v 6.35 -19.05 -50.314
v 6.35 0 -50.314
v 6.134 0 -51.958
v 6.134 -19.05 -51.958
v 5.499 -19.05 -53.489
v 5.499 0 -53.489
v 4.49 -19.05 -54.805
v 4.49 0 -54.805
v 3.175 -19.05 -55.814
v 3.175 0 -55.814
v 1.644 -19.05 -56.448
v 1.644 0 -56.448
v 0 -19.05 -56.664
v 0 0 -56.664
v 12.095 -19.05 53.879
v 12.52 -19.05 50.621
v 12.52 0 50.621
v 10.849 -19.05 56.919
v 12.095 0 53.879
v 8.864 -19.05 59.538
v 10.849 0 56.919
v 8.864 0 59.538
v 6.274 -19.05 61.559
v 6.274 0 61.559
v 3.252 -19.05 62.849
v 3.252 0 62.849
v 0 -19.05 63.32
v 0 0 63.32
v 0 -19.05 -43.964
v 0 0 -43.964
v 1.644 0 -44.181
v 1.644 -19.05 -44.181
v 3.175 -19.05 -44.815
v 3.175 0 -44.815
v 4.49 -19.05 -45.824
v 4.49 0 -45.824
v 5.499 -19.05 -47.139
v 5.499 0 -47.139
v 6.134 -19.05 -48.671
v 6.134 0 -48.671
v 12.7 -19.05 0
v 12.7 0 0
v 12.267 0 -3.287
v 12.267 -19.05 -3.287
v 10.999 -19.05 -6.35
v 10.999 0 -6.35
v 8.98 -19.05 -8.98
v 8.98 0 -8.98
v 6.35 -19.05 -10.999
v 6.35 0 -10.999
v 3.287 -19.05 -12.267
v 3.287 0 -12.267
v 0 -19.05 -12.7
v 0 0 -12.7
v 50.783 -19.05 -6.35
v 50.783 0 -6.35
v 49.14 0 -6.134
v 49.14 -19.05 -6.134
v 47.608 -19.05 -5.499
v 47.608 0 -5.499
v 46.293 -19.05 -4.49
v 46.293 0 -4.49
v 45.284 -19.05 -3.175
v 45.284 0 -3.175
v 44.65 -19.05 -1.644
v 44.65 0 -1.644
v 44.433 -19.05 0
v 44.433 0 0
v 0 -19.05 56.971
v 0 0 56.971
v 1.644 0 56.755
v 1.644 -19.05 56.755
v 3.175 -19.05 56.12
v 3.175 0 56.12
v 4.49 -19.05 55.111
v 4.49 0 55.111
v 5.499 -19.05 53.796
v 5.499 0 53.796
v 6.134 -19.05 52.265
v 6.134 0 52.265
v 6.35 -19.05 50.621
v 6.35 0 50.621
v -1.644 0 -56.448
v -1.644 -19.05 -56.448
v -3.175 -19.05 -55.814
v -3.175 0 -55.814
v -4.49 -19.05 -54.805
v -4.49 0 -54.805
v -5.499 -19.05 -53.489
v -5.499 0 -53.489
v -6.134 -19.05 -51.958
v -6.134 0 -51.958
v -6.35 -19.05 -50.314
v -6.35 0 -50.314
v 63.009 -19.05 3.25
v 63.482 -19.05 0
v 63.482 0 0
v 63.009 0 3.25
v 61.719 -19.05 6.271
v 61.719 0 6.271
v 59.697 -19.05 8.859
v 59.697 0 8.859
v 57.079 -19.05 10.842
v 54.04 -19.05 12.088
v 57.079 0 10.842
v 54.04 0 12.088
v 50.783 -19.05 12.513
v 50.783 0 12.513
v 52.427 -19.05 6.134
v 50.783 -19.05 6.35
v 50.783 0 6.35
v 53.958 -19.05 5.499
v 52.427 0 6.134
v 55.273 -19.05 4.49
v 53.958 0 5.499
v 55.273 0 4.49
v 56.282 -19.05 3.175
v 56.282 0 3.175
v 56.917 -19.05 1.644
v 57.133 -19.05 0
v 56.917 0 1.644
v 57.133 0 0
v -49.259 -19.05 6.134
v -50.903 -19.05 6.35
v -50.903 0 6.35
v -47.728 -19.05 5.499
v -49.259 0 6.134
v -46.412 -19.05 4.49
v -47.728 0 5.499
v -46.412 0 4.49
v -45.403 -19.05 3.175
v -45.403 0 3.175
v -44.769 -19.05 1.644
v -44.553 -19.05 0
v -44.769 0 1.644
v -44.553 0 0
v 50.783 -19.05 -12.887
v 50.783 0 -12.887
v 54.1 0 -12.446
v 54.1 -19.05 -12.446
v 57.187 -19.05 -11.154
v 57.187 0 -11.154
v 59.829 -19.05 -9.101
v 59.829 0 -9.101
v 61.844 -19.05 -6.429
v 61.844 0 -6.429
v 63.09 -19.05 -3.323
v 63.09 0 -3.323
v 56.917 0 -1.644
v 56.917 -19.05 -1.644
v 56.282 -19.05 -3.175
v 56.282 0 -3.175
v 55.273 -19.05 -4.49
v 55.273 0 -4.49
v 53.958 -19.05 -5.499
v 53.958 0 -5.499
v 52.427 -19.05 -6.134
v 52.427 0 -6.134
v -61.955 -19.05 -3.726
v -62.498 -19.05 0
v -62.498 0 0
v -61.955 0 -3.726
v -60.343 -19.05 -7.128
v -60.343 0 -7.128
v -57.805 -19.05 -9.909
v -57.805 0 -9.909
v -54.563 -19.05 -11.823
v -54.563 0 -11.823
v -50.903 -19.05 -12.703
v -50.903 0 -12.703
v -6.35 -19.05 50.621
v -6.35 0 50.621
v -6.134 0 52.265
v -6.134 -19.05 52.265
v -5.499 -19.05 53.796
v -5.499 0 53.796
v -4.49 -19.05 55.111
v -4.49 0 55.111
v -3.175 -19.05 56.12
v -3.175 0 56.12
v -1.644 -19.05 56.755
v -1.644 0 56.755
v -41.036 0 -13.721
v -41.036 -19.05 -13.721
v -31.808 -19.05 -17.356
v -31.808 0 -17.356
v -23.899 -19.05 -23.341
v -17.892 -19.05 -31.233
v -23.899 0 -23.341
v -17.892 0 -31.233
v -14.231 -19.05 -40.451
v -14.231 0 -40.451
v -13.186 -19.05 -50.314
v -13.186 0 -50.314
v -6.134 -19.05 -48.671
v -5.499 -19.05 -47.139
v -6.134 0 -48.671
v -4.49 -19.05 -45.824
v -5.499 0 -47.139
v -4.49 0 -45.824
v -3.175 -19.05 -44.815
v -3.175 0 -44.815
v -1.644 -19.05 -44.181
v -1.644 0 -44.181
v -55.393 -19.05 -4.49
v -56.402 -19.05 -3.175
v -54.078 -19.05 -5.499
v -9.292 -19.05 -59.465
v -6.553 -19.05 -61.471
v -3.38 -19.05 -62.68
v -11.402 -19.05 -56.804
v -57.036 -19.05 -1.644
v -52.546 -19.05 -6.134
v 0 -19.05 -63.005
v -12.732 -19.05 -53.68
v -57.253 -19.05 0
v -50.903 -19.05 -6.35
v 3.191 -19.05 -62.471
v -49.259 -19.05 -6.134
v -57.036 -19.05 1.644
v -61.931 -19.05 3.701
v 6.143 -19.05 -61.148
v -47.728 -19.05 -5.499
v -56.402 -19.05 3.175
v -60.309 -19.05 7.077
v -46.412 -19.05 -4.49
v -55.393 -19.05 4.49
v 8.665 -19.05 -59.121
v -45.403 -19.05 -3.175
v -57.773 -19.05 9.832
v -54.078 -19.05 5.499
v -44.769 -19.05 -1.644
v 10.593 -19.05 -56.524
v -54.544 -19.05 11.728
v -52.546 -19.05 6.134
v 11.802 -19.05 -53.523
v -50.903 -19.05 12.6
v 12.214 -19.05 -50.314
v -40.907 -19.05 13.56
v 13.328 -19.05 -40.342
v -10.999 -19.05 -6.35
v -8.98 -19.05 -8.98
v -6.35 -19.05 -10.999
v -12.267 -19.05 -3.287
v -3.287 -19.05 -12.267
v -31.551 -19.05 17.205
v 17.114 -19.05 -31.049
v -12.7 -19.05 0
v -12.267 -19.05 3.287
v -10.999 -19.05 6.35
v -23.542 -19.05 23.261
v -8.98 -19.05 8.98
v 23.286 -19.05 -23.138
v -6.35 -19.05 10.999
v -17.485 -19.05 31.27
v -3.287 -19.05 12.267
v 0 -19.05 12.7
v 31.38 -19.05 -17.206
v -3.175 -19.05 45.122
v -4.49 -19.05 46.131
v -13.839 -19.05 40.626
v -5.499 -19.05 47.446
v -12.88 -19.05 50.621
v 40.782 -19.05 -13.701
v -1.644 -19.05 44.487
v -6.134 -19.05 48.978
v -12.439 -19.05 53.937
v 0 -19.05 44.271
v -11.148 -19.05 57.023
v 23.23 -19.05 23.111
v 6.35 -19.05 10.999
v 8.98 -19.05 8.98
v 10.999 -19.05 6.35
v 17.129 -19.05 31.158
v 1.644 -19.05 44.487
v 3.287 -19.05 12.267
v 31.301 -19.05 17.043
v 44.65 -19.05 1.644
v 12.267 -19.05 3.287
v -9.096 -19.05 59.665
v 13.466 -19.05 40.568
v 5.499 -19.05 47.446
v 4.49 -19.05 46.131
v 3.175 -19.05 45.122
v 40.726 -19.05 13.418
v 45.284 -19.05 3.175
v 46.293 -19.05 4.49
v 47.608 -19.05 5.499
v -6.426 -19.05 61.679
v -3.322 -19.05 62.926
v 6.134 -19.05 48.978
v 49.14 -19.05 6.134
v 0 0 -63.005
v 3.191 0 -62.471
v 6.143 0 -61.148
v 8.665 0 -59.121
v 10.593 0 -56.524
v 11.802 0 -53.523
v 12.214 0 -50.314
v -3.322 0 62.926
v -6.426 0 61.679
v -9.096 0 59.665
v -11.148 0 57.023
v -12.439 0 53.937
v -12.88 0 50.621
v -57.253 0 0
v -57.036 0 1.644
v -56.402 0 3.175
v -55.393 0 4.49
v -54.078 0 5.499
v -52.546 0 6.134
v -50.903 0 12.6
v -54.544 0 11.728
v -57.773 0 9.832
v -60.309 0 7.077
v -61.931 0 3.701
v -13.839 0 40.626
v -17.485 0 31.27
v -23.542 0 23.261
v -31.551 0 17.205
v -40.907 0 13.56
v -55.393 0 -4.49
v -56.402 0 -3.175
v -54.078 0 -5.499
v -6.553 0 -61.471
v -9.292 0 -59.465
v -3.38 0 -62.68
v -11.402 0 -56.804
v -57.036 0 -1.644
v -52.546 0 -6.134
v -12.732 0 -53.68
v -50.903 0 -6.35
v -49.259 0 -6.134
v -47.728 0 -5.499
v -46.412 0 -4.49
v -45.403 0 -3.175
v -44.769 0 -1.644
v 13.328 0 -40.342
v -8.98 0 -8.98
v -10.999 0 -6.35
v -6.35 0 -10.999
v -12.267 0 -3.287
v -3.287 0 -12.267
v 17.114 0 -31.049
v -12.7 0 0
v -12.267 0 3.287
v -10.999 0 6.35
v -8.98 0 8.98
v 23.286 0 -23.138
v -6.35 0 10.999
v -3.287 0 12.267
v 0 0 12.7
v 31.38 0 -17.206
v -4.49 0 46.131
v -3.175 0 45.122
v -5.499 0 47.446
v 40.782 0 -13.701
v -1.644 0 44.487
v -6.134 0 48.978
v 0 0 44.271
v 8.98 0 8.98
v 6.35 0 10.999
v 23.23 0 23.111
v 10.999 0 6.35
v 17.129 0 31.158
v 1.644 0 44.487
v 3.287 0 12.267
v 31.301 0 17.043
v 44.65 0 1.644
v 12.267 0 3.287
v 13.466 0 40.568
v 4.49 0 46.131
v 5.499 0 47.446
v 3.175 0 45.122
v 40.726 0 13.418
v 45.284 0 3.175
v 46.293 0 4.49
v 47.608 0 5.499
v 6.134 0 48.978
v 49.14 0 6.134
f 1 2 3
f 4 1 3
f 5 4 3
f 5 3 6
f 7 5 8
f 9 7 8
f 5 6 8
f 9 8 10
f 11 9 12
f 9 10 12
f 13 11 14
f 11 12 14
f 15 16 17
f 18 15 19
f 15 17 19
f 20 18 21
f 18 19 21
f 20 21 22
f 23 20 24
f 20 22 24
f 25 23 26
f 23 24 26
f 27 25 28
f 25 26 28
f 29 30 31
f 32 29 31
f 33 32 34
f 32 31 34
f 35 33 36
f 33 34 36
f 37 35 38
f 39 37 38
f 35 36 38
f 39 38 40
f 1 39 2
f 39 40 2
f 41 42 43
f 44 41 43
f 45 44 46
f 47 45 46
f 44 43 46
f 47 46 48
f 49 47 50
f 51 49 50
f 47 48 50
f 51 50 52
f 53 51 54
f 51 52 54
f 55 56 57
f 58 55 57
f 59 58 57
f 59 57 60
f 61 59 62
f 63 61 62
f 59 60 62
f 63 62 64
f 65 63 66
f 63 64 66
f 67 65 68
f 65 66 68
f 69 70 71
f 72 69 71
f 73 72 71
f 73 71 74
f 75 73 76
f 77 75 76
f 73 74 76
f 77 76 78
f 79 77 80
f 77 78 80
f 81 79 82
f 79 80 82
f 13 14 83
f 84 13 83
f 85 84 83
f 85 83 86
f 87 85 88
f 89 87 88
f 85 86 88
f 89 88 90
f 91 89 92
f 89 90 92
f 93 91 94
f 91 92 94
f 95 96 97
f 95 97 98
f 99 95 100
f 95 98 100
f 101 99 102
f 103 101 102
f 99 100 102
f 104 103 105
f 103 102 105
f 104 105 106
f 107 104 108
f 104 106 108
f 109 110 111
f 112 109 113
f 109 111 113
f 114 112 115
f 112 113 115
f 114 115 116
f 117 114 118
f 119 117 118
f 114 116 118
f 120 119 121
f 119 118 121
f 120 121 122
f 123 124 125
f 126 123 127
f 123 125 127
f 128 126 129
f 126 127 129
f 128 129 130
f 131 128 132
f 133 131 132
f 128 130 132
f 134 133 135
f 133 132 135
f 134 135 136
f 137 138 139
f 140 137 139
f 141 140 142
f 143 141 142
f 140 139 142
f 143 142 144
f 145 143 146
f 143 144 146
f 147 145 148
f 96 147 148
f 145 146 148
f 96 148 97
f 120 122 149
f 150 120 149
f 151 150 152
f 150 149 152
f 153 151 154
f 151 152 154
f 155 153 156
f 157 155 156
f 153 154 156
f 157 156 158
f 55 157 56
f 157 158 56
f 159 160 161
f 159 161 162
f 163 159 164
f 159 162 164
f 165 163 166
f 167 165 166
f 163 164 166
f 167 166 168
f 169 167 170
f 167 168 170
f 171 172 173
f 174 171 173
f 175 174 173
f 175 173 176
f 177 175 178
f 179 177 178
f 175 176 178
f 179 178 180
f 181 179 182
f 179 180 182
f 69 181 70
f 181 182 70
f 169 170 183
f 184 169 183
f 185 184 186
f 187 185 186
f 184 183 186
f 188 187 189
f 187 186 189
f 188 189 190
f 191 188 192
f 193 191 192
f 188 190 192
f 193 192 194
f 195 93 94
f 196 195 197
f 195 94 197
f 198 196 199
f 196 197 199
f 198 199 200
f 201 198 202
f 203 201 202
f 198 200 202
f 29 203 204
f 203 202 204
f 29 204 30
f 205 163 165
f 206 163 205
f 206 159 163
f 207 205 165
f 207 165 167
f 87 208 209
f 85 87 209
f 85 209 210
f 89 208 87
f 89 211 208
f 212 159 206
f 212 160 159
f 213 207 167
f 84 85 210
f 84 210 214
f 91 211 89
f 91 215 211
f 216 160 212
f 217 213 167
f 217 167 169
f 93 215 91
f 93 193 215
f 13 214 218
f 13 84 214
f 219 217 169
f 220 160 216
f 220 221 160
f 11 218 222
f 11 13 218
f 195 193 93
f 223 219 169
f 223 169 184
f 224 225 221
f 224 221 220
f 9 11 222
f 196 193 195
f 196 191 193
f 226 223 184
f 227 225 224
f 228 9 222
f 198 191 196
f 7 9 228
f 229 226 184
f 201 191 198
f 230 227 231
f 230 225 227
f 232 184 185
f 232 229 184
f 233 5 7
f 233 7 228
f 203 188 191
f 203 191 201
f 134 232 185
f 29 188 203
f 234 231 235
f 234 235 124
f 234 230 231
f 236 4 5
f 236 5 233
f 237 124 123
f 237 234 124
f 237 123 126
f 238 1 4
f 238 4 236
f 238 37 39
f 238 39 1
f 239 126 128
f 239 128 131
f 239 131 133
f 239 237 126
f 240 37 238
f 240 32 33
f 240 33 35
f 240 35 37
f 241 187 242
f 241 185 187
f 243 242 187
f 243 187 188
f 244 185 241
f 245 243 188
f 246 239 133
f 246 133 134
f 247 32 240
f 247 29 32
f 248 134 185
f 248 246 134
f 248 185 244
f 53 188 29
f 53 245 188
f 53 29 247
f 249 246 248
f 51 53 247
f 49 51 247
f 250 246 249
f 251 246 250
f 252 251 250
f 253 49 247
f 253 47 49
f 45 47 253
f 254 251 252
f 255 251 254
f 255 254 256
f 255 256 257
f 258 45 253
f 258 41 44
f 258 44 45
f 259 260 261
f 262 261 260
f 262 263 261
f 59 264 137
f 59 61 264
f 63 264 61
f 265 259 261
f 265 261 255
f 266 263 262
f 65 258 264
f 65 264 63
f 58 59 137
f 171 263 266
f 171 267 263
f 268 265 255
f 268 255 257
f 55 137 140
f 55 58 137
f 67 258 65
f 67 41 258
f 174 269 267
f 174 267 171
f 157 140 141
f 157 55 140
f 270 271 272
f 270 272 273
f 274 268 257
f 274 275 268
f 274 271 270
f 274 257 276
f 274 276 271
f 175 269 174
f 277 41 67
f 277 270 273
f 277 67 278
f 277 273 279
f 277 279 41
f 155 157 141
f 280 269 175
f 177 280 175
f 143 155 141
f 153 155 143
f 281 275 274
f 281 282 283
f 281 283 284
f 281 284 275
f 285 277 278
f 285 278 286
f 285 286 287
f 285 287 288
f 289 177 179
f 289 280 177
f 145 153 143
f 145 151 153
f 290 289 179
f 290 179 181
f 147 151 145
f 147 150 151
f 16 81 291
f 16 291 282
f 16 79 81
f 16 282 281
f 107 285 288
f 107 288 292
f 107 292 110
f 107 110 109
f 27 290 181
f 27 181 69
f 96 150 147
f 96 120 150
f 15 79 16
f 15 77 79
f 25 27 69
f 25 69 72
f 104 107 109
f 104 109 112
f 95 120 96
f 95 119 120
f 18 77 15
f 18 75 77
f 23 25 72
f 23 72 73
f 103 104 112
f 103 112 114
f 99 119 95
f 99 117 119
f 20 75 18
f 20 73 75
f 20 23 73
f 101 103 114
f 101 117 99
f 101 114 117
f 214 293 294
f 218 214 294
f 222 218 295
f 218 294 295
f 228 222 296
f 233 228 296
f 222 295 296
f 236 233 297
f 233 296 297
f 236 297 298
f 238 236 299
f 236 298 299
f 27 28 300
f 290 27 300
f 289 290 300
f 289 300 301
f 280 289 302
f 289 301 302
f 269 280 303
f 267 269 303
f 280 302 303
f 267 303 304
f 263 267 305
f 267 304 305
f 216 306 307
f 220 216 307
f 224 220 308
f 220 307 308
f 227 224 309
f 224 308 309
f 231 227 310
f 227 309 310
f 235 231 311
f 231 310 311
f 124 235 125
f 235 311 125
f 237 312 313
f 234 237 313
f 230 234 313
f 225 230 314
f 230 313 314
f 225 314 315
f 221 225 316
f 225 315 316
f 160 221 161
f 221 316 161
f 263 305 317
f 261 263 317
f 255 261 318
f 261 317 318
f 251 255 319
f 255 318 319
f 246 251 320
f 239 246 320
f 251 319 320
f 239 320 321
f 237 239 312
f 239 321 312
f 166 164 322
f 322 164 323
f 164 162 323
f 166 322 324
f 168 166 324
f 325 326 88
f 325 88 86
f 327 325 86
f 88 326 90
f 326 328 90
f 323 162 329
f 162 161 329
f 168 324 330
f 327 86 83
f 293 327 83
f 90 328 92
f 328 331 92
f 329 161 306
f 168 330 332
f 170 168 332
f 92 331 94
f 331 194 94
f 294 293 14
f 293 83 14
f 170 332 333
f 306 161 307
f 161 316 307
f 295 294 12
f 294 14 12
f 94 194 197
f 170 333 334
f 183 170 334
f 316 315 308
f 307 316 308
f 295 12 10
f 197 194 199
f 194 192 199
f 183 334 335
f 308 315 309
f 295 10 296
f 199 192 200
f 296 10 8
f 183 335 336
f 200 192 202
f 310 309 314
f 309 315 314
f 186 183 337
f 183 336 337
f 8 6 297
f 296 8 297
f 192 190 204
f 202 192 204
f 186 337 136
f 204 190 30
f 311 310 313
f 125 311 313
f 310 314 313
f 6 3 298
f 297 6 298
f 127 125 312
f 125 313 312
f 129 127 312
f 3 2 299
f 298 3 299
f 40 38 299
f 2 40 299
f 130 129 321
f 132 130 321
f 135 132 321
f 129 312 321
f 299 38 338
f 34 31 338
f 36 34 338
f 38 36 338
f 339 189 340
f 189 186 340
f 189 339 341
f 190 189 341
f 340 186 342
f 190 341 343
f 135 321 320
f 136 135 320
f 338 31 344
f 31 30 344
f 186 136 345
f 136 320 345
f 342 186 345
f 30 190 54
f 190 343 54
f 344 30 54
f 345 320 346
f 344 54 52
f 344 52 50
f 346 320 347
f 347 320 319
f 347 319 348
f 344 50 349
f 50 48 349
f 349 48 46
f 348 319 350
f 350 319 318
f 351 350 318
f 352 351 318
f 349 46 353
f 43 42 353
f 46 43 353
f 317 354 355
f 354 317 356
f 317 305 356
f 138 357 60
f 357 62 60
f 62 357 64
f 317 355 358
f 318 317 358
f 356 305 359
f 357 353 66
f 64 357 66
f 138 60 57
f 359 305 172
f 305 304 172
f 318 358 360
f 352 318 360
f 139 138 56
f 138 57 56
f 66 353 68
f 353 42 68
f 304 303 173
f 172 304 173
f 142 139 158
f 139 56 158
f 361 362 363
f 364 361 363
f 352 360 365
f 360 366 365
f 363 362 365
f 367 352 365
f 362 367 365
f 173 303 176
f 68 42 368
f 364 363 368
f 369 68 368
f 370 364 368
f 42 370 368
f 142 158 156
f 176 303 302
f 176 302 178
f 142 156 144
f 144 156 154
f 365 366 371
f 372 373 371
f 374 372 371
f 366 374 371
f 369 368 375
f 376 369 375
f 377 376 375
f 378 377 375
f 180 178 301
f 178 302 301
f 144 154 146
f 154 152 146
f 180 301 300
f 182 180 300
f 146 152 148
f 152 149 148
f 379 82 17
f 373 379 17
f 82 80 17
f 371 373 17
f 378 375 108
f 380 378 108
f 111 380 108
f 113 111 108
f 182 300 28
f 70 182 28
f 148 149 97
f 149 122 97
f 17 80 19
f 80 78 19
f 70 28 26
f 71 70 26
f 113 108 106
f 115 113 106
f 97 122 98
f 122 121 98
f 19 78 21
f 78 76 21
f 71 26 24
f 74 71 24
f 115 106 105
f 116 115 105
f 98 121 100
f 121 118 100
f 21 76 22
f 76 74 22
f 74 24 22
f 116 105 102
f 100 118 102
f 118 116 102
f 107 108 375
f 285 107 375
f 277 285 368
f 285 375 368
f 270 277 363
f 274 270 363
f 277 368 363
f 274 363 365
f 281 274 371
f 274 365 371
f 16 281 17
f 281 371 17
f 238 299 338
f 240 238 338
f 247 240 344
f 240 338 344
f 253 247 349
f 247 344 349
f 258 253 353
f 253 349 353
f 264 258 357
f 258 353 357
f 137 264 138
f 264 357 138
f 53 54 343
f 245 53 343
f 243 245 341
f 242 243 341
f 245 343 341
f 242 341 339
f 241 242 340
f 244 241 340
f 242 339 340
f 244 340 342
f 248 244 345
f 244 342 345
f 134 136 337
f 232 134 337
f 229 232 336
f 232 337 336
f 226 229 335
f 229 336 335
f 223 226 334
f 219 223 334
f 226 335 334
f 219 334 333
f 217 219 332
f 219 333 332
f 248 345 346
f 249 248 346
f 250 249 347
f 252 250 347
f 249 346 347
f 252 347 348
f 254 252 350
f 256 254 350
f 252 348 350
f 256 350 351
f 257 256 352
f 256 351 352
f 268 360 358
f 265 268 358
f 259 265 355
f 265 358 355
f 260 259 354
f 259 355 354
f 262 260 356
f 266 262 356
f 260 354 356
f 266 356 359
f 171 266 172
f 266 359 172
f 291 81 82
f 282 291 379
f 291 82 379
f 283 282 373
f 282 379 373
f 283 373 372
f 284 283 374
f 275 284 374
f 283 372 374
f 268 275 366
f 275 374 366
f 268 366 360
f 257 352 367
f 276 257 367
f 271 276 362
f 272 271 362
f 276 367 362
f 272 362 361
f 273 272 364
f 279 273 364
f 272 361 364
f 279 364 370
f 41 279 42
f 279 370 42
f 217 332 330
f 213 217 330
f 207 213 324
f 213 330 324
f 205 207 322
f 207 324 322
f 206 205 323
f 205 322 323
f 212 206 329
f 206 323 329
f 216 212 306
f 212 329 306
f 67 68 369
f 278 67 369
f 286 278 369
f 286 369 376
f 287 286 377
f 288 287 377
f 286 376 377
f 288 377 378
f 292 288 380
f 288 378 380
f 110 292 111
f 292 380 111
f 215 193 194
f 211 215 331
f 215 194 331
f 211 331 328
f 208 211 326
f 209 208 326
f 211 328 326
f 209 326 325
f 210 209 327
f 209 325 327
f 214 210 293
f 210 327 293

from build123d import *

# Parameters (mm, degrees)
F1_DEPTH = 19.05


with BuildPart() as f1:
    # F0 (on Front) → F1 (new body)
    with BuildSketch(Plane.XZ):
        with BuildLine():
            Line((44.433185, 0), (12.7, 0))
            ThreePointArc((12.7, 0), (8.980256, -8.980256), (0, -12.7))
            Line((0, -12.7), (0, -43.964499))
            ThreePointArc((0, -43.964499), (4.490128, -45.824371), (6.35, -50.314499))
            Line((6.35, -50.314499), (12.214499, -50.314499))
            ThreePointArc((12.214499, -50.314499), (23.286426, -23.137993), (50.783185, -12.887225))
            Line((50.783185, -12.887225), (50.783185, -6.35))
            ThreePointArc((50.783185, -6.35), (46.293057, -4.490128), (44.433185, 0))
        make_face()
        with BuildLine():
            ThreePointArc((0, 12.7), (8.980256, 8.980256), (12.7, 0))
            Line((12.7, 0), (44.433185, 0))
            ThreePointArc((44.433185, 0), (46.293057, 4.490128), (50.783185, 6.35))
            Line((50.783185, 6.35), (50.783185, 12.512775))
            ThreePointArc((50.783185, 12.512775), (23.230066, 23.111098), (12.520352, 50.621112))
            Line((12.520352, 50.621112), (6.35, 50.621112))
            ThreePointArc((6.35, 50.621112), (4.490128, 46.130984), (0, 44.271112))
            Line((0, 44.271112), (0, 12.7))
        make_face()
        with BuildLine():
            ThreePointArc((-12.7, 0), (-8.980256, 8.980256), (0, 12.7))
            Line((0, 12.7), (0, 44.271112))
            ThreePointArc((0, 44.271112), (-4.490128, 46.130984), (-6.35, 50.621112))
            Line((-6.35, 50.621112), (-12.879648, 50.621112))
            ThreePointArc((-12.879648, 50.621112), (-23.542161, 23.261338), (-50.902573, 12.600462))
            Line((-50.902573, 12.600462), (-50.902573, 6.35))
            ThreePointArc((-50.902573, 6.35), (-46.412445, 4.490128), (-44.552573, 0))
            Line((-44.552573, 0), (-12.7, 0))
        make_face()
        with BuildLine():
            Line((0, -43.964499), (0, -12.7))
            ThreePointArc((0, -12.7), (-8.980256, -8.980256), (-12.7, 0))
            Line((-12.7, 0), (-44.552573, 0))
            ThreePointArc((-44.552573, 0), (-46.412445, -4.490128), (-50.902573, -6.35))
            Line((-50.902573, -6.35), (-50.902573, -12.70329))
            ThreePointArc((-50.902573, -12.70329), (-23.898918, -23.34085), (-13.185501, -50.314499))
            Line((-13.185501, -50.314499), (-6.35, -50.314499))
            ThreePointArc((-6.35, -50.314499), (-4.490128, -45.824371), (0, -43.964499))
        make_face()
        with BuildLine():
            Line((50.783185, 12.512775), (50.783185, 6.35))
            ThreePointArc((50.783185, 6.35), (55.273313, 4.490128), (57.133185, 0))
            Line((57.133185, 0), (63.481805, 0))
            ThreePointArc((63.481805, 0), (59.697001, 8.858983), (50.783185, 12.512775))
        make_face()
        with BuildLine():
            ThreePointArc((57.133185, 0), (55.273313, -4.490128), (50.783185, -6.35))
            Line((50.783185, -6.35), (50.783185, -12.887225))
            ThreePointArc((50.783185, -12.887225), (59.829393, -9.101041), (63.481805, 0))
            Line((63.481805, 0), (57.133185, 0))
        make_face()
        with BuildLine():
            Line((-12.879648, 50.621112), (-6.35, 50.621112))
            ThreePointArc((-6.35, 50.621112), (-4.490128, 55.11124), (0, 56.971112))
            Line((0, 56.971112), (0, 63.319841))
            ThreePointArc((0, 63.319841), (-9.096163, 59.66466), (-12.879648, 50.621112))
        make_face()
        with BuildLine():
            ThreePointArc((0, 56.971112), (4.490128, 55.11124), (6.35, 50.621112))
            Line((6.35, 50.621112), (12.520352, 50.621112))
            ThreePointArc((12.520352, 50.621112), (8.8639, 59.537626), (0, 63.319841))
            Line((0, 63.319841), (0, 56.971112))
        make_face()
        with BuildLine():
            Line((12.214499, -50.314499), (6.35, -50.314499))
            ThreePointArc((6.35, -50.314499), (4.490128, -54.804627), (0, -56.664499))
            Line((0, -56.664499), (0, -63.005216))
            ThreePointArc((0, -63.005216), (8.664796, -59.121432), (12.214499, -50.314499))
        make_face()
        with BuildLine():
            ThreePointArc((0, -56.664499), (-4.490128, -54.804627), (-6.35, -50.314499))
            Line((-6.35, -50.314499), (-13.185501, -50.314499))
            ThreePointArc((-13.185501, -50.314499), (-9.292434, -59.464796), (0, -63.005216))
            Line((0, -63.005216), (0, -56.664499))
        make_face()
        with BuildLine():
            ThreePointArc((-57.252573, 0), (-55.392701, 4.490128), (-50.902573, 6.35))
            Line((-50.902573, 6.35), (-50.902573, 12.600462))
            ThreePointArc((-50.902573, 12.600462), (-59.143267, 8.548377), (-62.497918, 0))
            Line((-62.497918, 0), (-57.252573, 0))
        make_face()
        with BuildLine():
            Line((-50.902573, -12.70329), (-50.902573, -6.35))
            ThreePointArc((-50.902573, -6.35), (-55.392701, -4.490128), (-57.252573, 0))
            Line((-57.252573, 0), (-62.497918, 0))
            ThreePointArc((-62.497918, 0), (-59.178005, -8.613301), (-50.902573, -12.70329))
        make_face()
    extrude(amount=F1_DEPTH)


solid = f1.part
